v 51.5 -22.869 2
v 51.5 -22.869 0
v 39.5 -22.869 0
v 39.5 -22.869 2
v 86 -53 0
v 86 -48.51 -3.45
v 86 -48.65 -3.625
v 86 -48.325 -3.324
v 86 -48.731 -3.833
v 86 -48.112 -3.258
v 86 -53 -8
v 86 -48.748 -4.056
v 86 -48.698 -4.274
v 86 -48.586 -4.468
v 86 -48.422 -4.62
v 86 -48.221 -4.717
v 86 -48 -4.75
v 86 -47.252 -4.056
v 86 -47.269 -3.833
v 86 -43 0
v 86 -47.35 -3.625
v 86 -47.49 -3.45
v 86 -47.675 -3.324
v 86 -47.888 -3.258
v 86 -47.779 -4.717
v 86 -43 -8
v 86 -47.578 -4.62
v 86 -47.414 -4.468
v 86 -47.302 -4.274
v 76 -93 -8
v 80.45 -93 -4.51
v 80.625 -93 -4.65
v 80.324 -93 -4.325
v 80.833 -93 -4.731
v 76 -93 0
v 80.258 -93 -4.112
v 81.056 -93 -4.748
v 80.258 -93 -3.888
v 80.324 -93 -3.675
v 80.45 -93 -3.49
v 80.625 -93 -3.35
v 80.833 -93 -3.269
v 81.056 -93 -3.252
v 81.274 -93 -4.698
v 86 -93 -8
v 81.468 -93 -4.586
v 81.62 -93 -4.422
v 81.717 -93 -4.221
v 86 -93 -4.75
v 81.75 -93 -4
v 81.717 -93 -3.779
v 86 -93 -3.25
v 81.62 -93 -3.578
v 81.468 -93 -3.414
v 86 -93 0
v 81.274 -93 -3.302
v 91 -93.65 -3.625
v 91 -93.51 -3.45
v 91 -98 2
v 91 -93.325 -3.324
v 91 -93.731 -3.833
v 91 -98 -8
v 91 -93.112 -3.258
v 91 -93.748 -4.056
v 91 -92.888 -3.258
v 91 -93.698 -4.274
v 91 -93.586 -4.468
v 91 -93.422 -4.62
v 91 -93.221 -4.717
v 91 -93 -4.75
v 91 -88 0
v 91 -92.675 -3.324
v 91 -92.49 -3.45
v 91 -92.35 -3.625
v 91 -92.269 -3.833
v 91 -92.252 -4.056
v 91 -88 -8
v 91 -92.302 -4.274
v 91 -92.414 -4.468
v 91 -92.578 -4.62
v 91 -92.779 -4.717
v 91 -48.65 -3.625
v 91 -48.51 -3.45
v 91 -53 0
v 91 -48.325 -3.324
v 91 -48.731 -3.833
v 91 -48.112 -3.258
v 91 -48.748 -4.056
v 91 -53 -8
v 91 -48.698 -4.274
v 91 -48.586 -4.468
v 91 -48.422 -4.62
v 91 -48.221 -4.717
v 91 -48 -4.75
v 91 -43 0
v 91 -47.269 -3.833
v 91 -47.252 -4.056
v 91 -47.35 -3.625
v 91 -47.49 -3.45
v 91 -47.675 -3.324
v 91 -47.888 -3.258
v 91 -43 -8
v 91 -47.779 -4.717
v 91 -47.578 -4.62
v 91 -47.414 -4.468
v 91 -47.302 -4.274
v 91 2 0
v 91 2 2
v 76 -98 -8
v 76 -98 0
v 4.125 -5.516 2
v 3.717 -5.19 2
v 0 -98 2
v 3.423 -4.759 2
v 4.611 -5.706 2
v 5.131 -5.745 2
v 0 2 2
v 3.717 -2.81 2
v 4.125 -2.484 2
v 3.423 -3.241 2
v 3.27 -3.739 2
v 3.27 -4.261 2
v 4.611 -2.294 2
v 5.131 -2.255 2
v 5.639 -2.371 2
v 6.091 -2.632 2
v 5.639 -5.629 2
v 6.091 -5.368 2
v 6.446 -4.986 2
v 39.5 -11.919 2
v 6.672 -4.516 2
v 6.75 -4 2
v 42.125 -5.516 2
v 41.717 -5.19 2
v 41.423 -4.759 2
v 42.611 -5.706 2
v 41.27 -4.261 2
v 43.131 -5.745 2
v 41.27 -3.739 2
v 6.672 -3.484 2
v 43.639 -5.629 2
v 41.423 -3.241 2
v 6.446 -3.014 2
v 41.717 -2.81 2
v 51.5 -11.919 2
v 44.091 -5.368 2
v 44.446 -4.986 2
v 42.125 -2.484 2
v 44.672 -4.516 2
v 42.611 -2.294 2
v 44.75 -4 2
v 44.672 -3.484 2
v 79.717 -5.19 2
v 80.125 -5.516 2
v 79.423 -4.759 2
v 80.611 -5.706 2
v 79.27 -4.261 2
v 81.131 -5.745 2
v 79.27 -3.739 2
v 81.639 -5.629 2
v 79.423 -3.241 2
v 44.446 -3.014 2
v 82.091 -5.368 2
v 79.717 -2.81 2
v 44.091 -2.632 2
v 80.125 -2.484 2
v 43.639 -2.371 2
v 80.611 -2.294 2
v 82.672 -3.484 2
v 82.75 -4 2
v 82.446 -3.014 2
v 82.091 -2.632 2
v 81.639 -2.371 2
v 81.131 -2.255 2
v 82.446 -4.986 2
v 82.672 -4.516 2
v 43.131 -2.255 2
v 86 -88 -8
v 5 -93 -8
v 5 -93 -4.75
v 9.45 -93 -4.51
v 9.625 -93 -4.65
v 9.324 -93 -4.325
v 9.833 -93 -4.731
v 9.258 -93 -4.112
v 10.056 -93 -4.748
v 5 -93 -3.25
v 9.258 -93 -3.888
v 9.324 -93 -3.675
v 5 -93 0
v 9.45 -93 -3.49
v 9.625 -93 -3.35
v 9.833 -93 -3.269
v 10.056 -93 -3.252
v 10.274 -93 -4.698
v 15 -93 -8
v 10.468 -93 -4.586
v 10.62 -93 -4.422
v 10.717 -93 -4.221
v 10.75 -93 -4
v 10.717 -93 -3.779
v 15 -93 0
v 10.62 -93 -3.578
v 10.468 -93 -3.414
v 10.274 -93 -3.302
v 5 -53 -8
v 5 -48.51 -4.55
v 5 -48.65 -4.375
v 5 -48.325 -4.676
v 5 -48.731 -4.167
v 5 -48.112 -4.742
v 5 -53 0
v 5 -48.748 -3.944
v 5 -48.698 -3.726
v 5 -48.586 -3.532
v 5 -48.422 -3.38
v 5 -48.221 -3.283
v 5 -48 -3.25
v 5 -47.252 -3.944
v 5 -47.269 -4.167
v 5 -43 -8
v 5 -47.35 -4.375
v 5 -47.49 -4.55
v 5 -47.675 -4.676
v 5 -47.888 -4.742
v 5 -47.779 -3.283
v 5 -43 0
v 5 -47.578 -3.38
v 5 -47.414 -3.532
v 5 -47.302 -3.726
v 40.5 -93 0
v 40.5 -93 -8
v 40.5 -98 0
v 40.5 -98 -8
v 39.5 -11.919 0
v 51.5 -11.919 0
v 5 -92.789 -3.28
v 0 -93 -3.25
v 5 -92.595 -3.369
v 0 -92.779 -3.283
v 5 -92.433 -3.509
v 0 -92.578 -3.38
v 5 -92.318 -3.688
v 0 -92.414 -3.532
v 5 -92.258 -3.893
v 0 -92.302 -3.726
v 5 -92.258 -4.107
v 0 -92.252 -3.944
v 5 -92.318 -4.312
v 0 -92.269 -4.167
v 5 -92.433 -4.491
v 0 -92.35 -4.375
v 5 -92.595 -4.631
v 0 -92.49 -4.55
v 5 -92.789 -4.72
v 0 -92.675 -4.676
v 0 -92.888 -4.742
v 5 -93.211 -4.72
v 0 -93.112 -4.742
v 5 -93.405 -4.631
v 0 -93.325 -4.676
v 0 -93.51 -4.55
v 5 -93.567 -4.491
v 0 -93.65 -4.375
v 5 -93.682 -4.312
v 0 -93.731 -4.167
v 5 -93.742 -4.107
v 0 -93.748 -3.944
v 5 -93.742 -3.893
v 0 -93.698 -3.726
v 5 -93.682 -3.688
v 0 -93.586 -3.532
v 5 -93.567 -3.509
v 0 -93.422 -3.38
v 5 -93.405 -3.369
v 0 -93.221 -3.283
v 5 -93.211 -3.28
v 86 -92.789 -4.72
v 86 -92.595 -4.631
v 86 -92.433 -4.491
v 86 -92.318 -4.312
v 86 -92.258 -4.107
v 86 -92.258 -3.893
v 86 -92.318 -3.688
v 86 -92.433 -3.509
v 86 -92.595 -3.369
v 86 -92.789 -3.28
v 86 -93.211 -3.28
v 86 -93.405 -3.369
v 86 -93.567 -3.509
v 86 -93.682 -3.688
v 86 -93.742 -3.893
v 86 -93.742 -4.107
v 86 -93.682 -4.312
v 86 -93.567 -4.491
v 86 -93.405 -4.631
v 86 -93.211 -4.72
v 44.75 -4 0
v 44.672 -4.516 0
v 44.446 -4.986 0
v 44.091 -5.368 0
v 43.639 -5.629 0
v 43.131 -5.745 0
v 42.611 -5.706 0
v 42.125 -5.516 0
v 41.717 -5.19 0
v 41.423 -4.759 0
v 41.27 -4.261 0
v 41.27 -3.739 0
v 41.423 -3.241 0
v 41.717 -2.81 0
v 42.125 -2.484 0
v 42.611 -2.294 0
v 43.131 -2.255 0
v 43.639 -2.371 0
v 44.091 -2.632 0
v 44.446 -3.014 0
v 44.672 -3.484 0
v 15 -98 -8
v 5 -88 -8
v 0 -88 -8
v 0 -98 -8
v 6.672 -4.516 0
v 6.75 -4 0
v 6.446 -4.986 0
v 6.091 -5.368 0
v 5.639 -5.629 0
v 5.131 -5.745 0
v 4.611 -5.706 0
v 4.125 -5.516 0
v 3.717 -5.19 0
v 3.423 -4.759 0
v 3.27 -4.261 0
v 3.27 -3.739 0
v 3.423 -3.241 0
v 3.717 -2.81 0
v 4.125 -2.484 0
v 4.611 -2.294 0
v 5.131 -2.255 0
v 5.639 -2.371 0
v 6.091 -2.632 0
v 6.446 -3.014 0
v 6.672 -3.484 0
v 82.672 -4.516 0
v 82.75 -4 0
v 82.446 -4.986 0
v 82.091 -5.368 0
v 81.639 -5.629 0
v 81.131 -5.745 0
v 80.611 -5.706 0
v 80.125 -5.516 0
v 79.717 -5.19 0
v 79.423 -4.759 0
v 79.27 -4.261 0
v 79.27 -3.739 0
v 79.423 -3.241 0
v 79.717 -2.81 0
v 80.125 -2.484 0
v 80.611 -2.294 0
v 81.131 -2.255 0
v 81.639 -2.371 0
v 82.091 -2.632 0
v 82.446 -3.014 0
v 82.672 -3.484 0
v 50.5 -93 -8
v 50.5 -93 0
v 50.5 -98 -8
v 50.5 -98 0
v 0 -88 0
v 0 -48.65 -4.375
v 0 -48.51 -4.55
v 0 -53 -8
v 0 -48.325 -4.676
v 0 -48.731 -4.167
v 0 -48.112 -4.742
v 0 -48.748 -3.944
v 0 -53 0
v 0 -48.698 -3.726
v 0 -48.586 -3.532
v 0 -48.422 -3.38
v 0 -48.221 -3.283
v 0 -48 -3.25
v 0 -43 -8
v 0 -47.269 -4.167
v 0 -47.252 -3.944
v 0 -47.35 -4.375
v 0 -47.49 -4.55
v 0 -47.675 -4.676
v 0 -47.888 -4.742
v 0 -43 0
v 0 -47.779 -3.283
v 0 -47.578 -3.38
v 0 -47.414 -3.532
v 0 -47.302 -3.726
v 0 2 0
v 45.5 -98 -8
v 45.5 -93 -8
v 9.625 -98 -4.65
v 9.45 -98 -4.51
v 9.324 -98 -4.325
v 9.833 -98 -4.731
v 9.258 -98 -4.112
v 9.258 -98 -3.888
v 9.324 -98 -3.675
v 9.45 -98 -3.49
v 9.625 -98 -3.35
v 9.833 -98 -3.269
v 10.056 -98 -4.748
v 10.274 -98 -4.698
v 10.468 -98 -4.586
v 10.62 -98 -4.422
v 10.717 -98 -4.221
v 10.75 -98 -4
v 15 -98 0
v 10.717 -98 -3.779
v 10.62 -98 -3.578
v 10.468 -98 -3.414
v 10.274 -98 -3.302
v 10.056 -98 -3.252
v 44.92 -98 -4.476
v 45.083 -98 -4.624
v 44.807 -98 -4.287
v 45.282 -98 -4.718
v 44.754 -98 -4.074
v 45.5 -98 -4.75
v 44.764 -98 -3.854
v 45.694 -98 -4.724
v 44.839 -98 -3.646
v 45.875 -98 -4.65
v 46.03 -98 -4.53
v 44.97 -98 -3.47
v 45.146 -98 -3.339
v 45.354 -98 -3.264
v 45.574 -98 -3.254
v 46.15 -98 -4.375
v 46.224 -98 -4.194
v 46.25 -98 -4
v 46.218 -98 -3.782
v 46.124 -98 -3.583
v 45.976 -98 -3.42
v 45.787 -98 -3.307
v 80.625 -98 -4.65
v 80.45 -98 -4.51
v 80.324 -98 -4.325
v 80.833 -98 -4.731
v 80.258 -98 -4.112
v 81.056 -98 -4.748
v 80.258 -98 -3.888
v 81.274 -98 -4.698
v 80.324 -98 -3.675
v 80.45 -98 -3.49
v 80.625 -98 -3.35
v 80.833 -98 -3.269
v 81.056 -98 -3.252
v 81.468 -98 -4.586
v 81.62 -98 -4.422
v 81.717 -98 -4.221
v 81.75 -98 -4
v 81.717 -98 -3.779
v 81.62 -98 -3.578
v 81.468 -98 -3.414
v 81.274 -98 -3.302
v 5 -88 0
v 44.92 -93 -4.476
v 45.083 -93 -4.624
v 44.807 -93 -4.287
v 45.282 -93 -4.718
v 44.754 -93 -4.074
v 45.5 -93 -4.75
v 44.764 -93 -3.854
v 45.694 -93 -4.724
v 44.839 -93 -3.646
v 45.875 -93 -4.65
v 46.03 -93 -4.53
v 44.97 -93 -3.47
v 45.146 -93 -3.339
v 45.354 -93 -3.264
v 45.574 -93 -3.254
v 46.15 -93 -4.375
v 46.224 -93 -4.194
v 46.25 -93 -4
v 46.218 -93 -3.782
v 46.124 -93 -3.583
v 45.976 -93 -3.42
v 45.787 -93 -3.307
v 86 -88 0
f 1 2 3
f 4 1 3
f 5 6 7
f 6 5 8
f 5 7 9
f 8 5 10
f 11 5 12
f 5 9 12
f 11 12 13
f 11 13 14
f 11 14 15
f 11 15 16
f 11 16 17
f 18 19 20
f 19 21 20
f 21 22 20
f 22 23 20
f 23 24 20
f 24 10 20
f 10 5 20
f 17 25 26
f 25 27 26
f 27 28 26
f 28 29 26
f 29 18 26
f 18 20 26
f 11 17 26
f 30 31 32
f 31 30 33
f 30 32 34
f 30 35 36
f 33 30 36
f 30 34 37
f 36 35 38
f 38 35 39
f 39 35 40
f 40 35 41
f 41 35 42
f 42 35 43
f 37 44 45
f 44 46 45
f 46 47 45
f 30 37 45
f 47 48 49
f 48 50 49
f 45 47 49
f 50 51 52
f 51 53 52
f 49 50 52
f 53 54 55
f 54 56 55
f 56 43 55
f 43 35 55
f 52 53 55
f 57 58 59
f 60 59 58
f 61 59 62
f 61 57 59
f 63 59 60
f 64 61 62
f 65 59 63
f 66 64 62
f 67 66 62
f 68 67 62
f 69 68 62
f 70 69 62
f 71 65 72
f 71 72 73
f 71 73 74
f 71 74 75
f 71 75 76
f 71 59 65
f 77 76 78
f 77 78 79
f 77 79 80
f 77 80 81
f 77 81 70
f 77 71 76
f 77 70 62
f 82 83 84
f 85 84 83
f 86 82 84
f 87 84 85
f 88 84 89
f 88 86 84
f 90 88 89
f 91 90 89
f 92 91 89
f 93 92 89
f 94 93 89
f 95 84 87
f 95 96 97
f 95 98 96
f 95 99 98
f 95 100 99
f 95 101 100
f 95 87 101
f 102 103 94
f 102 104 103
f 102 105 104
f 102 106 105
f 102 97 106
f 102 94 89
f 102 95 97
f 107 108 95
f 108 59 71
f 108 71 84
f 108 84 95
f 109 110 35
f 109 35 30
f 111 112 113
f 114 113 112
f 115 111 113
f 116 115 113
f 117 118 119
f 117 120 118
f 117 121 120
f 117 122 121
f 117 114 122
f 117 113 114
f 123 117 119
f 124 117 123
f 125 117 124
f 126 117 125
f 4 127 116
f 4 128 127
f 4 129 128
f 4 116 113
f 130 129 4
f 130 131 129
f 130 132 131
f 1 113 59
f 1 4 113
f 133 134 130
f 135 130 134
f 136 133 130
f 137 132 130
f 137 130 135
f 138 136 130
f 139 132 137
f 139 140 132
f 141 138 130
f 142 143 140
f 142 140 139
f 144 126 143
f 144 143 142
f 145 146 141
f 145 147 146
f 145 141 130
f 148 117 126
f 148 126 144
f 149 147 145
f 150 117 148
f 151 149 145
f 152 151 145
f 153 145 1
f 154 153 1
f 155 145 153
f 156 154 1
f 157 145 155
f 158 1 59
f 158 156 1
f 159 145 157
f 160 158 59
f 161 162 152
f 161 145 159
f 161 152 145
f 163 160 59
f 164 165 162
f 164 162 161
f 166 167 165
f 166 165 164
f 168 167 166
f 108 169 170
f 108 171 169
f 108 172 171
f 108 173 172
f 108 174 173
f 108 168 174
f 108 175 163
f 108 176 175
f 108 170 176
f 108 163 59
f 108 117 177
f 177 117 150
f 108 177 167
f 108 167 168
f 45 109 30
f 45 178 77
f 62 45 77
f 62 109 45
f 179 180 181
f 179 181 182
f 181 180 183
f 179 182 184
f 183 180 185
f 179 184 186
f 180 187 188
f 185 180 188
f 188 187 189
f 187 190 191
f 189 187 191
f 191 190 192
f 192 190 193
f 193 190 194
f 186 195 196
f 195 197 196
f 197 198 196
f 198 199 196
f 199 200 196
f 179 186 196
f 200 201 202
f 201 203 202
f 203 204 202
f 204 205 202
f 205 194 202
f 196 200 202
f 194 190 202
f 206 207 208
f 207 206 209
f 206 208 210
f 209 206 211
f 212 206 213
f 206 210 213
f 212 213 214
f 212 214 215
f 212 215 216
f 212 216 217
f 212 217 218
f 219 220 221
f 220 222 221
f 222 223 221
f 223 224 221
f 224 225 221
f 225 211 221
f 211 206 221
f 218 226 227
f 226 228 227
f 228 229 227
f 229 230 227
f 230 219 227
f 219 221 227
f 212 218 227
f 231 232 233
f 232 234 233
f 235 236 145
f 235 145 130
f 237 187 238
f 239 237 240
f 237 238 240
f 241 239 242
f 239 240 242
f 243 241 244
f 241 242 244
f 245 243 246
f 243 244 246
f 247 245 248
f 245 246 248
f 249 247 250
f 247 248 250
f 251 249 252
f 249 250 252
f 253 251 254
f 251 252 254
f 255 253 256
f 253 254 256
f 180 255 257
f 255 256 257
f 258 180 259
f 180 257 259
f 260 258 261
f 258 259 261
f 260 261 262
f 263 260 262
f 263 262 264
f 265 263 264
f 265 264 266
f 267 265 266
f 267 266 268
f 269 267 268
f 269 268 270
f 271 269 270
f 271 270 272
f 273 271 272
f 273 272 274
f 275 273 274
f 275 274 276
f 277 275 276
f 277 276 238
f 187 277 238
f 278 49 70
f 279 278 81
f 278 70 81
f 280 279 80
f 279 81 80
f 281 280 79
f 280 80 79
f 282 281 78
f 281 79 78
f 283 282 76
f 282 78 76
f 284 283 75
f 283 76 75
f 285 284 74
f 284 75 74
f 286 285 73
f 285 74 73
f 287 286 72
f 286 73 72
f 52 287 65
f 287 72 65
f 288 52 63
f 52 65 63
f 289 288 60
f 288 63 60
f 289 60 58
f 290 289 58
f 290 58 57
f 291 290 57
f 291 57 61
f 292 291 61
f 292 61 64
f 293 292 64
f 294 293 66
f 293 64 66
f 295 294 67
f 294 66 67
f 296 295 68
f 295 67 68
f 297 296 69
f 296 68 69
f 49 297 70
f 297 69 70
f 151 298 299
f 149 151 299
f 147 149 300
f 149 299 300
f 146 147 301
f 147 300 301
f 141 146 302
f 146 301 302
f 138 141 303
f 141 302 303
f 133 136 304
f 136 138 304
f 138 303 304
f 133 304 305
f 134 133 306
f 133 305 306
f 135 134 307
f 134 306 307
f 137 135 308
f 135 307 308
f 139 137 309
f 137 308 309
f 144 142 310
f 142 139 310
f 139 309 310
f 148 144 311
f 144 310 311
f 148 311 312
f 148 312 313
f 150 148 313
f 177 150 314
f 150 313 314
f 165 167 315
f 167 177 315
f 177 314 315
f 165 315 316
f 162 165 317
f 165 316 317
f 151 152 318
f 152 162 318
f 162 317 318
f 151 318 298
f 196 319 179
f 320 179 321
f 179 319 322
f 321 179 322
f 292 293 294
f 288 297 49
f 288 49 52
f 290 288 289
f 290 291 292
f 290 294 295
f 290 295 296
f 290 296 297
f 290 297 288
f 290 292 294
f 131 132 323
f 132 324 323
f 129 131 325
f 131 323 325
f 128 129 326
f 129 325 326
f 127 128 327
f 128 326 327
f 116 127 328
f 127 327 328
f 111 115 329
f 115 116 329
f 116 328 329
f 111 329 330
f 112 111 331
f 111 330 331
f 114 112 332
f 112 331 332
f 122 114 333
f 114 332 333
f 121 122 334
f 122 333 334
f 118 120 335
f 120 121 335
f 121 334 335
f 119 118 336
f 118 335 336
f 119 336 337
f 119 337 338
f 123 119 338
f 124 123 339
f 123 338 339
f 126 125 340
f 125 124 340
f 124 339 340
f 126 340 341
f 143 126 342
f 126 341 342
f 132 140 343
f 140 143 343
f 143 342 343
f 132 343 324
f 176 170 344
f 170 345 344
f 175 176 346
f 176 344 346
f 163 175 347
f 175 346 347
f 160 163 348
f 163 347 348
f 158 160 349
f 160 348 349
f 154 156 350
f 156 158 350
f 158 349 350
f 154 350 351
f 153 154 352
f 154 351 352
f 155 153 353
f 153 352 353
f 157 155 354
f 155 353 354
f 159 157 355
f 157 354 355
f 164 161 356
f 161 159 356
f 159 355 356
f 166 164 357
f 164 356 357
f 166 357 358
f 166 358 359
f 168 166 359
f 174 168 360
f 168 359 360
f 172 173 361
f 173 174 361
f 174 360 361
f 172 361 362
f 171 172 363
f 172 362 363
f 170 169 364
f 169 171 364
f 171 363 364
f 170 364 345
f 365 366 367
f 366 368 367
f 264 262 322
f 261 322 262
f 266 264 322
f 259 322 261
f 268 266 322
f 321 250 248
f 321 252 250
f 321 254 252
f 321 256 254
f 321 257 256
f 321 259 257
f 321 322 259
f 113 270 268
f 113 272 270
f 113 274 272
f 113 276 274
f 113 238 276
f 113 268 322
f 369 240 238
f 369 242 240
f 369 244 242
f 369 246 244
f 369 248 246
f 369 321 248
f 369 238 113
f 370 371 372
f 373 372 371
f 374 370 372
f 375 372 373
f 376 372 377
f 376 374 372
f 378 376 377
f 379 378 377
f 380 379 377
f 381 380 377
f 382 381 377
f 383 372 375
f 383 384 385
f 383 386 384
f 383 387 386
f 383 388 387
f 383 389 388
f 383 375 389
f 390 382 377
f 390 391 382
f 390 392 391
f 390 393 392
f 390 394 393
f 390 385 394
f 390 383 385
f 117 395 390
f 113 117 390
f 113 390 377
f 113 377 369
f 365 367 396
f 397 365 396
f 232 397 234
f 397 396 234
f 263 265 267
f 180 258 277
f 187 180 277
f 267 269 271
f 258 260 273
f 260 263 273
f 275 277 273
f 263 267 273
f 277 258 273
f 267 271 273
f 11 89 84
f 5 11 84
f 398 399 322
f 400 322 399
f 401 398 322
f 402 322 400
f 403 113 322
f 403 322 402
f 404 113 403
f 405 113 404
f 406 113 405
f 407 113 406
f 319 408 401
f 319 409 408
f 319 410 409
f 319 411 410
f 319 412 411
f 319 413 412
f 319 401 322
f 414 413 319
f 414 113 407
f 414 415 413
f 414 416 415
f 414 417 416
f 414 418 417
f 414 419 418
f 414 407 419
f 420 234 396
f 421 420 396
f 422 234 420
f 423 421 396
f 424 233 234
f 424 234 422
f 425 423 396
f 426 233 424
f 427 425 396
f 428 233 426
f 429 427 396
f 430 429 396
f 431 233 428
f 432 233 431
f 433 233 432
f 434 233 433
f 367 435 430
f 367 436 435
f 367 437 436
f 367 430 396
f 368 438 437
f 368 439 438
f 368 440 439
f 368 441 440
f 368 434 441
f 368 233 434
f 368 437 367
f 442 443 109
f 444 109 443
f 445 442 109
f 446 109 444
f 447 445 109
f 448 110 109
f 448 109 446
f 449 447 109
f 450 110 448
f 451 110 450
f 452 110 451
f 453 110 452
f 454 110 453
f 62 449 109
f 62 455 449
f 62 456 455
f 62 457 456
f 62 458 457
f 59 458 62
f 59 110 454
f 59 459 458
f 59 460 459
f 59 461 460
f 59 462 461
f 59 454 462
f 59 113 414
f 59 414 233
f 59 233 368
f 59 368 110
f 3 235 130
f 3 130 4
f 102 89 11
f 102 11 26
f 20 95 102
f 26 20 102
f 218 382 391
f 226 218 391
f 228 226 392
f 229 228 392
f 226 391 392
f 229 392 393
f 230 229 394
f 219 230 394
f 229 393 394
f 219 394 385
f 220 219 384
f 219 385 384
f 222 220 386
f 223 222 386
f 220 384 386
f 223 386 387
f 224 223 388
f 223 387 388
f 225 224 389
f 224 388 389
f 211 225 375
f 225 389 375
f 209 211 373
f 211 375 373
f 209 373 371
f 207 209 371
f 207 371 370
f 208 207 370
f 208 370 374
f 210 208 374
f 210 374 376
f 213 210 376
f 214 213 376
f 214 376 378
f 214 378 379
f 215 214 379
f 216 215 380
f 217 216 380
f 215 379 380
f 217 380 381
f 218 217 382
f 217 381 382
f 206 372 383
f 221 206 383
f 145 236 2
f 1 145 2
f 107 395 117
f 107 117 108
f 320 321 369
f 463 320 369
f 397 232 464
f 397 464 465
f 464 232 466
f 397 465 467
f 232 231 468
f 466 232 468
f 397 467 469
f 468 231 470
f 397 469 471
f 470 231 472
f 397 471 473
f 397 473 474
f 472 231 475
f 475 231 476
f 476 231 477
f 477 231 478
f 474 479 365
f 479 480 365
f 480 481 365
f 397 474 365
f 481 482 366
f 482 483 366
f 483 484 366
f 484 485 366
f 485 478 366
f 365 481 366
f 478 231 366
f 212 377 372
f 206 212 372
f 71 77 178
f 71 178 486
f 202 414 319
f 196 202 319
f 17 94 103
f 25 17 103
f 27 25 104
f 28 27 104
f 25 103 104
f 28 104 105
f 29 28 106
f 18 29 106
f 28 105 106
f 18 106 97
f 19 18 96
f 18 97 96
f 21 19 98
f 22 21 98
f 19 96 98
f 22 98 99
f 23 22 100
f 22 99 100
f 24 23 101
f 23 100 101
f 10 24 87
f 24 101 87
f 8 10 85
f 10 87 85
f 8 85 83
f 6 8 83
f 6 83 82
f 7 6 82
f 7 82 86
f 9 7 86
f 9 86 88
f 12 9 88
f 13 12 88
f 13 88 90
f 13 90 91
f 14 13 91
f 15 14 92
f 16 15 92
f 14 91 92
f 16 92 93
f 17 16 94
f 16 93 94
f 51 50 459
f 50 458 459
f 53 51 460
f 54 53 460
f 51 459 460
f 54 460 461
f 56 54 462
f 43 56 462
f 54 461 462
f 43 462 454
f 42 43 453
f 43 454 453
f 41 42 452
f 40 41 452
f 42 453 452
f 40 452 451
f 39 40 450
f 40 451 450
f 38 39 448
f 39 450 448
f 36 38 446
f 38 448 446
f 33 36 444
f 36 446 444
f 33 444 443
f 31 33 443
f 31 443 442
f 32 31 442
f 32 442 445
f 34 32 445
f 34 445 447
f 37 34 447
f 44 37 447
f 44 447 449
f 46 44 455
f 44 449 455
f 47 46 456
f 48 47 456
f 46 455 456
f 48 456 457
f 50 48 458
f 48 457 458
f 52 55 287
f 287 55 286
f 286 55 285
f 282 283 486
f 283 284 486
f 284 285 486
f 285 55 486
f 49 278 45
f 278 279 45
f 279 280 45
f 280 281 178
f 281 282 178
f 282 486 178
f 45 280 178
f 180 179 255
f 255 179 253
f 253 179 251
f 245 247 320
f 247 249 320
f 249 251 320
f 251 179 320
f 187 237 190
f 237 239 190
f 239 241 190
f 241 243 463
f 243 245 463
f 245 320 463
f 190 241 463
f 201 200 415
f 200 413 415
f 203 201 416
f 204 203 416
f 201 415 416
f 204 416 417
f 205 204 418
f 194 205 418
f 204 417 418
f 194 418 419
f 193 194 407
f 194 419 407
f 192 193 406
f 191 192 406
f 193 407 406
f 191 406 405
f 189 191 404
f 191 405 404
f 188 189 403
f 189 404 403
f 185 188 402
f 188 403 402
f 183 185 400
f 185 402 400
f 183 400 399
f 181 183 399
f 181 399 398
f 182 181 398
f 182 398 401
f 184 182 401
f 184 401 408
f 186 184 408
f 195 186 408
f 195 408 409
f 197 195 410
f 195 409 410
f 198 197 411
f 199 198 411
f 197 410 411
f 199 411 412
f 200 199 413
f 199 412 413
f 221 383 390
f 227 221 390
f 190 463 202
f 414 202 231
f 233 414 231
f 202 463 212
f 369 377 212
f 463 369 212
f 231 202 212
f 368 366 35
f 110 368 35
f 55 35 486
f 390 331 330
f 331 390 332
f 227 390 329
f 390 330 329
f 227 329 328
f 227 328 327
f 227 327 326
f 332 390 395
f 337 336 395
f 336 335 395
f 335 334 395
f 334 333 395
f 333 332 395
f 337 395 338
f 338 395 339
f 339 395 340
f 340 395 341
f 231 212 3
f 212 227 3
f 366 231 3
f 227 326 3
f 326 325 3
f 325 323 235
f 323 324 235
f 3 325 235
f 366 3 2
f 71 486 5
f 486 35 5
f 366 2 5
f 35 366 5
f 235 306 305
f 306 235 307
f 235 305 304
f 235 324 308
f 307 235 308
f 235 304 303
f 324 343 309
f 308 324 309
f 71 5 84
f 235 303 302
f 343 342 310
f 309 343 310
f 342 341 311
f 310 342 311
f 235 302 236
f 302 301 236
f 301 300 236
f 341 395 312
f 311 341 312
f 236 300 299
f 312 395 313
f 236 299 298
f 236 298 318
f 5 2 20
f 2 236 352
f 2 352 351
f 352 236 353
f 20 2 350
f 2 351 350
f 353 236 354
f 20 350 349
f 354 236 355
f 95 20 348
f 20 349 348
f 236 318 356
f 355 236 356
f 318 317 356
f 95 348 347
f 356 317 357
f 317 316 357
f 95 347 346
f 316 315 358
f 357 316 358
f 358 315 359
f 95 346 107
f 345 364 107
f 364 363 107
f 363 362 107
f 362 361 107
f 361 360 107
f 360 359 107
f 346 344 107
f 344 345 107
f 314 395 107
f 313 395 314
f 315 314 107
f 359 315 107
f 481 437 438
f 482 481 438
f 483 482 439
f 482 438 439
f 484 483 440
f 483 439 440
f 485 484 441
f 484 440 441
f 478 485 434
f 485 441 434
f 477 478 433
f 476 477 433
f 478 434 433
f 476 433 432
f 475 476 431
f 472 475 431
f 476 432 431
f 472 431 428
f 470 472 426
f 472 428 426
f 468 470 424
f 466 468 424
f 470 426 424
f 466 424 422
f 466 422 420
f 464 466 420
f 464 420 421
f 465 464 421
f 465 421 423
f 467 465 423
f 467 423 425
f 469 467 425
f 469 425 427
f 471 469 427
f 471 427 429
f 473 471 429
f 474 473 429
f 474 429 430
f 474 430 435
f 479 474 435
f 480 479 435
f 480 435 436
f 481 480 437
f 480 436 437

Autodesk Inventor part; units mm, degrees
ref_plane "YZ Plane" through (0, 0, 0) normal (1, 0, 0) x (0, 1, 0)
ref_plane "XZ Plane" through (0, 0, 0) normal (0, 1, 0) x (-1, 0, 0)
ref_plane "XY Plane" through (0, 0, 0) normal (0, 0, 1) x (1, 0, 0)
ref_plane "Work Plane1" through (0, 0, 0) normal (0, 0, 1) x (1, 0, 0)
sketch "Sketch1" plane through (0, 0, 0) normal (0, 0, 1) x (1, 0, 0)
  line L0 (0, 2) -> (91, 2) projected
  line L1 (51.2, -11.9194) -> (39.8, -11.9194) projected
  line L2 (39.5, -11.9194) -> (39.5, -22.3444) projected
  line L3 (40.05, -22.8694) -> (50.95, -22.8694) projected
  line L4 (51.5, -11.9194) -> (51.5, -22.3444) projected
  line L5 (39.5, -11.9194) -> (51.5, -11.9194)
  line L6 (51.5, -11.9194) -> (51.5, -22.8694)
  line L7 (51.5, -22.8694) -> (39.5, -22.8694)
  line L8 (39.5, -22.8694) -> (39.5, -11.9194)
  line L9 (0, 2) -> (91, 2)
  line L10 (91, 2) -> (91, -98)
  line L11 (91, -98) -> (0, -98)
  line L12 (0, -98) -> (0, 2)
  circle A0 centre (5, -4) radius 0.75 projected
  circle A1 centre (43, -4) radius 0.75 projected
  circle A2 centre (81, -4) radius 0.75 projected
  circle A3 centre (5, -4) radius 1.75
  circle A4 centre (43, -4) radius 1.75
  circle A5 centre (81, -4) radius 1.75
  point P0 (0, 0)
  dimension "d0" = 91
  dimension "d1" = 100
  dimension "d2" = 1
  dimension "d3" = 1
  dimension "d4" = 1
extrude "Extrusion1" add sketch "Sketch1" along normal blind 2 contours L0 L10 L11 L12
sketch "Sketch2" plane through (0, 0, 0) normal (0, 0, -1) x (-1, 0, 0)
  line L0 (-91, 2) -> (0, 2) projected
  line L1 (0, 2) -> (-91, 2)
  point P0 (0, 0)
sketch "Sketch3" plane through (0, 0, 0) normal (0, 0, -1) x (-1, 0, 0)
  point P0 (0, 0)
sketch "Sketch4" plane through (0, -98, 0) normal (-1, 0, 0) x (0, 0, 1)
  line L0 (0, 100) -> (0, 0) projected
  circle A0 centre (-4, 50) radius 0.75
  line L1 (-8, 50) -> (-8, 55)
  line L2 (-8, 55) -> (0, 55)
  line L3 (0, 55) -> (0, 45)
  line L4 (0, 45) -> (-8, 45)
  line L5 (-8, 45) -> (-8, 50)
  point P0 (0, 98)
  dimension "d8" = 1.5
  dimension "d9" = 4
  dimension "d10" = 5
  dimension "d11" = 8
  dimension "d12" = 10
  dimension "d13" = 8
extrude "Extrusion2" add sketch "Sketch4" against normal blind 5
sketch "Sketch5" plane through (0, -98, 2) normal (-1, 0, 0) x (0, 0, 1)
  line L0 (-2, 0) -> (-2, 45) projected
  line L1 (-2, 0) -> (-10, 0)
  line L2 (-10, 0) -> (-10, 10)
  line L3 (-10, 10) -> (-2, 10)
  line L4 (-2, 10) -> (-2, 0)
  circle A0 centre (-6, 5) radius 0.75
  point P0 (-2, 98)
  dimension "d16" = 8
  dimension "d17" = 10
  dimension "d19" = 1.5
extrude "Extrusion3" add sketch "Sketch5" against normal blind 5
sketch "Sketch6" plane through (0, -98, 2) normal (0, -1, 0) x (1, 0, 0)
  line L0 (5, -10) -> (5, -2) projected
  line L1 (5, -2) -> (15, -2)
  line L2 (15, -2) -> (15, -10)
  line L3 (15, -10) -> (5, -10)
  line L4 (5, -10) -> (5, -2)
  circle A0 centre (10, -6) radius 0.75
  point P0 (0, -2)
  dimension "d22" = 10
  dimension "d23" = 8
  dimension "d25" = 1.5
extrude "Extrusion4" add sketch "Sketch6" against normal blind 5
sketch "Sketch7" plane through (91, -98, 0) normal (1, 0, 0) x (0, 0, -1)
  circle A0 centre (4, 50) radius 0.75 projected
  circle A1 centre (4, 50) radius 0.75
  line L0 (8, 45) -> (0, 45) projected
  line L1 (0, 55) -> (8, 55) projected
  line L2 (0, 45) -> (8, 45)
  line L3 (8, 45) -> (8, 55)
  line L4 (8, 55) -> (0, 55)
  line L5 (0, 55) -> (0, 45)
  point P0 (0, 98)
extrude "Extrusion5" add sketch "Sketch7" against normal blind 5
sketch "Sketch8" plane through (91, -98, 2) normal (1, 0, 0) x (0, 0, -1)
  arc A0 (6.75, 5) -> (5.25, 5) centre (6, 5) ccw projected
  circle A1 centre (6, 5) radius 0.75
  line L0 (10, 10) -> (2, 10) projected
  line L1 (2, 0) -> (10, 0) projected
  line L2 (10, 10) -> (2, 10)
  line L3 (2, 10) -> (2, 0)
  line L4 (2, 0) -> (10, 0)
  line L5 (10, 0) -> (10, 10)
  point P0 (2, 98)
extrude "Extrusion6" add sketch "Sketch8" against normal blind 5
sketch "Sketch9" plane through (0, -98, 2) normal (0, -1, 0) x (1, 0, 0)
  point P0 (0, -2)
sketch "Sketch10" plane through (0, -98, 2) normal (0, -1, 0) x (1, 0, 0)
  line L0 (86, -2) -> (15, -2) projected
  line L1 (86, -2) -> (76, -2)
  line L2 (76, -2) -> (76, -10)
  line L3 (76, -10) -> (86, -10)
  line L4 (86, -10) -> (86, -2)
  circle A0 centre (81, -6) radius 0.75
  point P0 (0, -2)
  dimension "d32" = 10
  dimension "d33" = 8
  dimension "d35" = 1.5
extrude "Extrusion7" add sketch "Sketch10" against normal blind 5
sketch "Sketch11" plane through (0, -98, 2) normal (0, -1, 0) x (1, 0, 0)
  line L0 (39.5, -2) -> (51.5, -2) projected
  circle A0 centre (45.5, -6) radius 0.75
  line L1 (45.5, -6) -> (45.5, -10)
  line L2 (45.5, -10) -> (40.5, -10)
  line L3 (40.5, -10) -> (40.5, -2)
  line L4 (40.5, -2) -> (50.5, -2)
  line L5 (50.5, -2) -> (50.5, -10)
  line L6 (50.5, -10) -> (45.5, -10)
  point P0 (0, -2)
  dimension "d39" = 1.5
  dimension "d40" = 4
  dimension "d41" = 5
  dimension "d42" = 8
  dimension "d43" = 10
  dimension "d44" = 8
extrude "Extrusion8" add sketch "Sketch11" against normal blind 5
properties part number "Before" material "Nylon 6/6"
